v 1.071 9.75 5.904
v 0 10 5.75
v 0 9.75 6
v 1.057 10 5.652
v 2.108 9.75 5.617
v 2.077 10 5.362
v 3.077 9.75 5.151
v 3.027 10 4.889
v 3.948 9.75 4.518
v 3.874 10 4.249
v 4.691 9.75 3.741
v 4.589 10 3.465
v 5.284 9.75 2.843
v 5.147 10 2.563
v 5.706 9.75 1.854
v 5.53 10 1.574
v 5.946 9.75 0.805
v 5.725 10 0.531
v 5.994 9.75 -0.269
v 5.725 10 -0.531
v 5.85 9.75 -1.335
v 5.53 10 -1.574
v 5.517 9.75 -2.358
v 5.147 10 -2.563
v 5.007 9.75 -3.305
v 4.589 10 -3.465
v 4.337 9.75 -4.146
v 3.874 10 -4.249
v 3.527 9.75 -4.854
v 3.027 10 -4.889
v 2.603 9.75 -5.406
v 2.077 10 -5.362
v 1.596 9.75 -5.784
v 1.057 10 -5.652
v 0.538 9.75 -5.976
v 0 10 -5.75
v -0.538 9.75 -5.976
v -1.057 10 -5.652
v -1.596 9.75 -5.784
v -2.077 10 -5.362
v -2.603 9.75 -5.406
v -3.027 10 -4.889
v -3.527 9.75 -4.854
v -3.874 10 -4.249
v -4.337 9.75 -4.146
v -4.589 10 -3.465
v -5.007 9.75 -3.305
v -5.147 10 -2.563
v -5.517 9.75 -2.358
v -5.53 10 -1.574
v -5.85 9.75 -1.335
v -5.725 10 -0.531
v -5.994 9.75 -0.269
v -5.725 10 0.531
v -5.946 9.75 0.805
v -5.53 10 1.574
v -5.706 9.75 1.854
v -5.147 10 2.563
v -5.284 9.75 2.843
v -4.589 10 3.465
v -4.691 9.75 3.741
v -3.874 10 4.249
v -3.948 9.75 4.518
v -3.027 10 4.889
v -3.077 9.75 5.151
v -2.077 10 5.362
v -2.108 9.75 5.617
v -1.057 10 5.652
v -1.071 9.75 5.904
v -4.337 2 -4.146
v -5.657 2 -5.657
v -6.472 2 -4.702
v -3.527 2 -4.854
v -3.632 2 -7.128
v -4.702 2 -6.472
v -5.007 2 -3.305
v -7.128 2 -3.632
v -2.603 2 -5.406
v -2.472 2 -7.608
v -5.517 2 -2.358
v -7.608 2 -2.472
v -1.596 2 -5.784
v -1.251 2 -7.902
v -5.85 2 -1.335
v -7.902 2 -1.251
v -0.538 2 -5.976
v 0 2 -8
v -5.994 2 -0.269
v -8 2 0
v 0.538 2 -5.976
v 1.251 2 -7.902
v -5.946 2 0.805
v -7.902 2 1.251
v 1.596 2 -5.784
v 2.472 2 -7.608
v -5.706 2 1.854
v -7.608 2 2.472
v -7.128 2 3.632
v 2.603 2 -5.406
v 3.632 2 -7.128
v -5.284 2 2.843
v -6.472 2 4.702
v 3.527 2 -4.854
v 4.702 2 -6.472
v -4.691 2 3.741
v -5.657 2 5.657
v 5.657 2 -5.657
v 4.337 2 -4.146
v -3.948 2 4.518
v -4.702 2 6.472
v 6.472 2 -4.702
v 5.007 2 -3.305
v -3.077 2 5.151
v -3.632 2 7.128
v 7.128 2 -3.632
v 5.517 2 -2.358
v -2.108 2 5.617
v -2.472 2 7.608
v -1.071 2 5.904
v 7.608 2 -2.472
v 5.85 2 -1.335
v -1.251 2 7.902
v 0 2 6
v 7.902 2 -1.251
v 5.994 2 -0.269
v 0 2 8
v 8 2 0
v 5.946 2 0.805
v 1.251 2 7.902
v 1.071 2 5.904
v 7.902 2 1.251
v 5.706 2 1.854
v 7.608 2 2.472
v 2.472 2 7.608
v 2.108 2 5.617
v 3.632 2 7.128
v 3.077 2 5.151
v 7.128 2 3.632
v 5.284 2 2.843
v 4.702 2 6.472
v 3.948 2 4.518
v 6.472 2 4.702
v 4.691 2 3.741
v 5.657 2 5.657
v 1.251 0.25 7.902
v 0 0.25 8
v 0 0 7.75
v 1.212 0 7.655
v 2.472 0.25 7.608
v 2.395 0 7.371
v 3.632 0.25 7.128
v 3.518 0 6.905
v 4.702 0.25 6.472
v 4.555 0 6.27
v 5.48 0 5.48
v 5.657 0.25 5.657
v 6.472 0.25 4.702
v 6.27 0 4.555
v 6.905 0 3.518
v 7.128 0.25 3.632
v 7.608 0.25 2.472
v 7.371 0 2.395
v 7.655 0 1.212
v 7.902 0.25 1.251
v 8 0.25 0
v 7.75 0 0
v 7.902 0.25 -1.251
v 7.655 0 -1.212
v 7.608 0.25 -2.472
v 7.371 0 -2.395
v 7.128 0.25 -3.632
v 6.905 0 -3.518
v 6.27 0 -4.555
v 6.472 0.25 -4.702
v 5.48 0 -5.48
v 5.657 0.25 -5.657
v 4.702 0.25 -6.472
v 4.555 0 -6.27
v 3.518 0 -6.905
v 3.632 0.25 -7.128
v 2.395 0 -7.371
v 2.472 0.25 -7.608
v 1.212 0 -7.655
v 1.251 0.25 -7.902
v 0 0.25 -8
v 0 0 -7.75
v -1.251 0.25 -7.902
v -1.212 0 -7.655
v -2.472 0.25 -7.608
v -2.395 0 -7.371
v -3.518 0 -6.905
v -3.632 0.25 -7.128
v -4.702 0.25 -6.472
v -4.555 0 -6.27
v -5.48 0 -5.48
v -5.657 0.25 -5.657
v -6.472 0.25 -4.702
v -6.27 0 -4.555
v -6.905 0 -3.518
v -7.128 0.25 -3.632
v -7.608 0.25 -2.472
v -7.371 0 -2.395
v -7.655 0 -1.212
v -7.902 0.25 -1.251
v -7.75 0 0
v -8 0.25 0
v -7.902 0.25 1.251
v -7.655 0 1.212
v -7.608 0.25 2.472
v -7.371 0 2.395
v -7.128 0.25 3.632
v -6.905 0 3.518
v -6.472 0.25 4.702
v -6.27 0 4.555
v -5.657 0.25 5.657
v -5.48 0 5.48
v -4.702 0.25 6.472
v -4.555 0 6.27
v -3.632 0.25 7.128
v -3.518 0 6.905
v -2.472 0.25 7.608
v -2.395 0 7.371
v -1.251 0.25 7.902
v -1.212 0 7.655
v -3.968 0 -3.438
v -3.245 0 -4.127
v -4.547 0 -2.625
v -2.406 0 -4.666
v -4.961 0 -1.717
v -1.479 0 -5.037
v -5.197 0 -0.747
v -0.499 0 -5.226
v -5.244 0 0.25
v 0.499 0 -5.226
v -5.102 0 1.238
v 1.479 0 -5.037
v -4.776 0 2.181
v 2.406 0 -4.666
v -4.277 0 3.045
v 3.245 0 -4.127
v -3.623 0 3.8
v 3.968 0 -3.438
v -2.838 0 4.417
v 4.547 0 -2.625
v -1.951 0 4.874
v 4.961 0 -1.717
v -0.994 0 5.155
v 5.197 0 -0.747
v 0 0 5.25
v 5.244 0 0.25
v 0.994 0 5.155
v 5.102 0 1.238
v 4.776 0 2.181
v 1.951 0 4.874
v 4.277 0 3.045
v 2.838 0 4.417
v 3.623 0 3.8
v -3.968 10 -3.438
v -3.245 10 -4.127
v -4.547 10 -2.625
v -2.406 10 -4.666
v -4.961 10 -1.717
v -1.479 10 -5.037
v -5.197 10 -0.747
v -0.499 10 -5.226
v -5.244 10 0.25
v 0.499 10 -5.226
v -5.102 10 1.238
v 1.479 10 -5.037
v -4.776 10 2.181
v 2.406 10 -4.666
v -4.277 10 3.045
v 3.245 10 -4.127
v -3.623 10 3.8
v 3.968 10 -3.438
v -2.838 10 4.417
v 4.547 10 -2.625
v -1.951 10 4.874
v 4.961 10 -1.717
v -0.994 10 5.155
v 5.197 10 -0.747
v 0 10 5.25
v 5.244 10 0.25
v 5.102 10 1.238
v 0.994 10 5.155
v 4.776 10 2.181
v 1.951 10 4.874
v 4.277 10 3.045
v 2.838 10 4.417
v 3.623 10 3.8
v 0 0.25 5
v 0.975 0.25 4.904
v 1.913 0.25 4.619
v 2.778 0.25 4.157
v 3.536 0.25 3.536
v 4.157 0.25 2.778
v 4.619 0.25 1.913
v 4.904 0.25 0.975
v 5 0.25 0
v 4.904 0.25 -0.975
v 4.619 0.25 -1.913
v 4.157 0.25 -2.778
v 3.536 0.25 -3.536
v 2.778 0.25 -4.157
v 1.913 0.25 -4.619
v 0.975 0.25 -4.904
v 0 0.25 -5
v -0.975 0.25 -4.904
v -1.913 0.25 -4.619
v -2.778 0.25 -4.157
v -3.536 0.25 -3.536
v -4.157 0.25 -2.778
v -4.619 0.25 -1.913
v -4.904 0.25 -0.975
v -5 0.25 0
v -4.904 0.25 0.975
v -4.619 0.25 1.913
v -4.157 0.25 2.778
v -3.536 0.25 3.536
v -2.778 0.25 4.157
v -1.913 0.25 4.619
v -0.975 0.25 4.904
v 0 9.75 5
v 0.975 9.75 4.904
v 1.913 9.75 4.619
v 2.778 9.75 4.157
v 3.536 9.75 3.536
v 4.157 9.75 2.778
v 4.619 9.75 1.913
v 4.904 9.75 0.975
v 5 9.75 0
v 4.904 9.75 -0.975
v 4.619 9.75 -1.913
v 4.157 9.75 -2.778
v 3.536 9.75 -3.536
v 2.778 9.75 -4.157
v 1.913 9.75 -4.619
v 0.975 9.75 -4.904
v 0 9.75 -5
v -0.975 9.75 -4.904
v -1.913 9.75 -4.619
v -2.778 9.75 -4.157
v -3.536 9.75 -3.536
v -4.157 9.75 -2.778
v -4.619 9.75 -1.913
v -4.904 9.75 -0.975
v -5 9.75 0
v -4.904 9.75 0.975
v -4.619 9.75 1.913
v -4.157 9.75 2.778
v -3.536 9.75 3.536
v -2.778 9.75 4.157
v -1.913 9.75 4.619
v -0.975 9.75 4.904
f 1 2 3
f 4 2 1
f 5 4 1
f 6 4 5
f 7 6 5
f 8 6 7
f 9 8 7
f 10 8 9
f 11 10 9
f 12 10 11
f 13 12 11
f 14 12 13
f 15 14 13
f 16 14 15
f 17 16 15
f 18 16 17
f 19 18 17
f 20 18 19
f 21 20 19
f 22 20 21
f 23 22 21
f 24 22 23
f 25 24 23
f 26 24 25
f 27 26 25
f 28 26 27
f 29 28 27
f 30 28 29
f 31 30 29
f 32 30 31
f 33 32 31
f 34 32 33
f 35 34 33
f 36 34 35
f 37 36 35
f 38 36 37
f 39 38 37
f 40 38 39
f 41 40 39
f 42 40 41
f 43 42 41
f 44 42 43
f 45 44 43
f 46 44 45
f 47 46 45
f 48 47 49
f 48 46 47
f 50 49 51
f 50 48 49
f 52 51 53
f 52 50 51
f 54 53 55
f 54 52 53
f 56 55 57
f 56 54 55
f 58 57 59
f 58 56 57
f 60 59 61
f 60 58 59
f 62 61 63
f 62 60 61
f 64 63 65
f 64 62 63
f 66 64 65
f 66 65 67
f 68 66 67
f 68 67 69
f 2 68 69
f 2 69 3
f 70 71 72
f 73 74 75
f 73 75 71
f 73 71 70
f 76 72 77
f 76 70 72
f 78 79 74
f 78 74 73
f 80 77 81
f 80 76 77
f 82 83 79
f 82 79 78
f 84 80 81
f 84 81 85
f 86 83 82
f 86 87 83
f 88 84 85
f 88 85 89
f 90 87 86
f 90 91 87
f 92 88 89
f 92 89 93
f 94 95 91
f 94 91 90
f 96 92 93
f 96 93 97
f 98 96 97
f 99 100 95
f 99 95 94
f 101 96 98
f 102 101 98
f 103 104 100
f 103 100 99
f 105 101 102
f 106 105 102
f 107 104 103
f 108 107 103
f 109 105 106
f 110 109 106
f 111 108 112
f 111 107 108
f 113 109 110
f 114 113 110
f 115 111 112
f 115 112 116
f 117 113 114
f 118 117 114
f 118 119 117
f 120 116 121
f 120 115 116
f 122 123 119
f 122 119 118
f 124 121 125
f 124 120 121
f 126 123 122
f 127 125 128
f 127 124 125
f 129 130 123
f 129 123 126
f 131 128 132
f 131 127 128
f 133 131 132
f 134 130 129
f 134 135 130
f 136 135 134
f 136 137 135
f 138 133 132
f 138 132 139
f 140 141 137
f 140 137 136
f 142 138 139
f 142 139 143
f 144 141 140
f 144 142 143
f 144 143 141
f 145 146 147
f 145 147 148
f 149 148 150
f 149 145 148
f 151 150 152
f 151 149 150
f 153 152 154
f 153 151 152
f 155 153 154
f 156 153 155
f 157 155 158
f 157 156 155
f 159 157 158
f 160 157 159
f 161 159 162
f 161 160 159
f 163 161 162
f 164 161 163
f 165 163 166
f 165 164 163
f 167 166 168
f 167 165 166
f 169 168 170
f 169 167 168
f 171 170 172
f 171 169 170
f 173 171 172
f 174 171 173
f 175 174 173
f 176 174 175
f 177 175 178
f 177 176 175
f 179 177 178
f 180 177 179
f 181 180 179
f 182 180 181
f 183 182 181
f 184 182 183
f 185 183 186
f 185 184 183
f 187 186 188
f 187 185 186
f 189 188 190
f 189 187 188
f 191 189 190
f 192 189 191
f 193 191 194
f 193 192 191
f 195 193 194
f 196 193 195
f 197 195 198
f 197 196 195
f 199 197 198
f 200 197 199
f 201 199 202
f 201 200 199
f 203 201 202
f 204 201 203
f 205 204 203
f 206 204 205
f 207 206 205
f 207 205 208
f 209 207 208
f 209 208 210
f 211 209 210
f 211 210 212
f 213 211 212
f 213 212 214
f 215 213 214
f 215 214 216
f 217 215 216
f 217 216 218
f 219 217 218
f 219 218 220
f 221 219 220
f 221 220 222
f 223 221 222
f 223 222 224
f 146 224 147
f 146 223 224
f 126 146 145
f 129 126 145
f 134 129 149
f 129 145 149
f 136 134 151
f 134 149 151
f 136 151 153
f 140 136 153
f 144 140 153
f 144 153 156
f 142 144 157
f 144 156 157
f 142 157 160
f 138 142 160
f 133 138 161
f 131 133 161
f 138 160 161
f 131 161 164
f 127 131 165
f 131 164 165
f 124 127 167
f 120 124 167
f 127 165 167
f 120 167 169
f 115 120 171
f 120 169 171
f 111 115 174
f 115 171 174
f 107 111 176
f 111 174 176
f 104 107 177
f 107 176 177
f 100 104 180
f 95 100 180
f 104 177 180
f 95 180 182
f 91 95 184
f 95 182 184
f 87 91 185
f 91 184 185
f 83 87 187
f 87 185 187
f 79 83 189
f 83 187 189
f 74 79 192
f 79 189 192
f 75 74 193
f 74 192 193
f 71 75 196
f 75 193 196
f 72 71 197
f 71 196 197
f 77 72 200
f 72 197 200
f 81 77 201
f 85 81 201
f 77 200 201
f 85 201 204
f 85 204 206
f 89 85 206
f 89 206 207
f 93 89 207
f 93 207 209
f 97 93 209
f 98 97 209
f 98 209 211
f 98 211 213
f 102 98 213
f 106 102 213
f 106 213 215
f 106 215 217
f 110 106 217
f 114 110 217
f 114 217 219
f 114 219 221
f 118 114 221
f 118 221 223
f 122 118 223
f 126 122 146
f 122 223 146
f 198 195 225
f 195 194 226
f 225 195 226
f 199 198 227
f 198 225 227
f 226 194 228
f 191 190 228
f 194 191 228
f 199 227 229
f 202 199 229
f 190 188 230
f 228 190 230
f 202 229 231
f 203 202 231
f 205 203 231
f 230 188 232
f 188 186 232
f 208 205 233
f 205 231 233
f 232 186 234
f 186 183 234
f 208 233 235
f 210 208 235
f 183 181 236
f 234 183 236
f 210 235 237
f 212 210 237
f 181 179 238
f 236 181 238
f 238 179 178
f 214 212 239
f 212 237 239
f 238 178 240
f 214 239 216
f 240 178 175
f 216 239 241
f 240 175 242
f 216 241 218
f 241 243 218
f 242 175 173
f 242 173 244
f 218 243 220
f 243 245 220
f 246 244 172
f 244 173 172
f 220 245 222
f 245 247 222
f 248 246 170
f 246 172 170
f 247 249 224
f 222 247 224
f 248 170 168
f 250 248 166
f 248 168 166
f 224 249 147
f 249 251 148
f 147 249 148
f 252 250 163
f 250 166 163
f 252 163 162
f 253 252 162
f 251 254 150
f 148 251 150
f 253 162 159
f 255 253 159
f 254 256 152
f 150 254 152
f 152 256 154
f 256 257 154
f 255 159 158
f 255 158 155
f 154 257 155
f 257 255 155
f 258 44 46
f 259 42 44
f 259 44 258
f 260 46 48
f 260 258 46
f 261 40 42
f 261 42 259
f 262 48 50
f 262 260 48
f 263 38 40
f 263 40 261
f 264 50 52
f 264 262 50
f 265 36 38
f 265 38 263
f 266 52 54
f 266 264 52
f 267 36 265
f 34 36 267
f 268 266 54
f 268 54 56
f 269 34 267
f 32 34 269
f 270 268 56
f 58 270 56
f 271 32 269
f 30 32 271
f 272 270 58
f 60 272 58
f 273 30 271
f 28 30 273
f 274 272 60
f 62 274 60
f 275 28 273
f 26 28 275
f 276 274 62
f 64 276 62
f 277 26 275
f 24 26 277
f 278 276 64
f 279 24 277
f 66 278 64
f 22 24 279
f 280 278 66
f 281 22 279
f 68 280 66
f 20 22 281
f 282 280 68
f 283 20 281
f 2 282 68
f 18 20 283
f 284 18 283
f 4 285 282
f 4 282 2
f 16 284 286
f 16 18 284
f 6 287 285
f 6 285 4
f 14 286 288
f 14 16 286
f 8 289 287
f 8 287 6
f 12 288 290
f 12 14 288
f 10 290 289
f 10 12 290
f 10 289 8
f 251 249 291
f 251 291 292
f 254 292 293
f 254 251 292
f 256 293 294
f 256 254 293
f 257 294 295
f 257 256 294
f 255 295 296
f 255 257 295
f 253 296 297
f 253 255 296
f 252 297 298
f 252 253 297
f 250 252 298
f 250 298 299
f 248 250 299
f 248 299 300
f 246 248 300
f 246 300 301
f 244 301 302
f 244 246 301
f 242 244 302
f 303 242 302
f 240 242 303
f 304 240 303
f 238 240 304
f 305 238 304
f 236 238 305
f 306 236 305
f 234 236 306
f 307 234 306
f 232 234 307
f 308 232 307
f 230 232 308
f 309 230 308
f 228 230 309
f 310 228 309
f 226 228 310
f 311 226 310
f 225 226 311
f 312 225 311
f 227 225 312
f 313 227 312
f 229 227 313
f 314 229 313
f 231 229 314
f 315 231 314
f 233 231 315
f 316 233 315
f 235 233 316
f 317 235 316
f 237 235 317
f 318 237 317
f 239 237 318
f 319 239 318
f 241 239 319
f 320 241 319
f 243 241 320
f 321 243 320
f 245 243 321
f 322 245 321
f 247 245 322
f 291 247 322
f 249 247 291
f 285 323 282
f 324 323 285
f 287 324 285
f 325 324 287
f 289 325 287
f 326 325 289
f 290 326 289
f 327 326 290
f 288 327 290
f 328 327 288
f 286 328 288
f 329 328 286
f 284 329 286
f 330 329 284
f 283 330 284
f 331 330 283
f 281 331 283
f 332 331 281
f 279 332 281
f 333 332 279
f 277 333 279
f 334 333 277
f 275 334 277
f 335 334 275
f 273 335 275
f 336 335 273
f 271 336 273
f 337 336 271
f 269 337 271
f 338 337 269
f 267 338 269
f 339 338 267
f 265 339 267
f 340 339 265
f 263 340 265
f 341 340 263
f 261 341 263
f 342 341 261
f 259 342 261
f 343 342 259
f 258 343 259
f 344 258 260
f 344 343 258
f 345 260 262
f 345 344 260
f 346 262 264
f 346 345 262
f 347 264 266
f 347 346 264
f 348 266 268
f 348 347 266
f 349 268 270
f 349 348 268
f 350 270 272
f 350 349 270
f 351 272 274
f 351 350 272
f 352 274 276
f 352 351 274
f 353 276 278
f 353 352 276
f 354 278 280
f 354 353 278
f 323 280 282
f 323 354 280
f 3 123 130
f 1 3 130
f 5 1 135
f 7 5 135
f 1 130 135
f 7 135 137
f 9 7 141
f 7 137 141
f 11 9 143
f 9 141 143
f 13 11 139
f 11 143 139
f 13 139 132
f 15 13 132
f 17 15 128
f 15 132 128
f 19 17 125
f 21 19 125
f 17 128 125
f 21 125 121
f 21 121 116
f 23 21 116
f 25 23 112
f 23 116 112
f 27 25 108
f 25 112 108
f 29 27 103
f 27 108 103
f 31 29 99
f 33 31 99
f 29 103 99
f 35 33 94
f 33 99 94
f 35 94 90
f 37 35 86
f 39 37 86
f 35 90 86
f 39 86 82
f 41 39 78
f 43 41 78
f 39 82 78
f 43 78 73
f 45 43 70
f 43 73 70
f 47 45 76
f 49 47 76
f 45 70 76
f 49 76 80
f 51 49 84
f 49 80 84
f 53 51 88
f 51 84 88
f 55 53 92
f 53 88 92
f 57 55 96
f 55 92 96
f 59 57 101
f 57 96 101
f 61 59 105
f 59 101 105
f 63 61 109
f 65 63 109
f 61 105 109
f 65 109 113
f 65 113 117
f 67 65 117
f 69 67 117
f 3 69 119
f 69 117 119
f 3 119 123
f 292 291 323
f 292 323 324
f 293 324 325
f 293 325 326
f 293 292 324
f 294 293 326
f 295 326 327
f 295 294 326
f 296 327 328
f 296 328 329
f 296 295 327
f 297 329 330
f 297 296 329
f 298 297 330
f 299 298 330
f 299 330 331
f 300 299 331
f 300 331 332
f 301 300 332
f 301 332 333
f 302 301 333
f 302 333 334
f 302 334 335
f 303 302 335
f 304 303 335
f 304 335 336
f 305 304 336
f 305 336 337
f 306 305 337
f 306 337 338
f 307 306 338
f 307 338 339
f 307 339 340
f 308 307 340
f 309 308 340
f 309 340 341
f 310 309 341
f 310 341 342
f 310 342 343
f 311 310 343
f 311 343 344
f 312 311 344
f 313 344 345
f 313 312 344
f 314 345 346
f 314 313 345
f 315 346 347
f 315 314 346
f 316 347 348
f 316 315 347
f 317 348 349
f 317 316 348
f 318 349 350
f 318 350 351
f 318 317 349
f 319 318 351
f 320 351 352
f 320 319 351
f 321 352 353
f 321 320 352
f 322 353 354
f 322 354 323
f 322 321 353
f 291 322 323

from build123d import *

# Parameters (mm, degrees)
SKETCH_1_R      = 8
SKETCH_1_R_2    = 5
EXTRUDE_1_DEPTH = 2
SKETCH_2_R      = 6
SKETCH_2_R_2    = 5
EXTRUDE_2_DEPTH = 8
CHAMFER_1_SIZE  = 0.25


with BuildPart() as part:
    # 草图1 → 凸台-拉伸1 (new body)
    with BuildSketch(Plane(origin=(0, 0, 0), x_dir=(1, 0, 0), z_dir=(0, 1, 0))):
        with Locations(Location((0, 0, 0), (0, 0, 270))):
            Circle(SKETCH_1_R)
        with Locations(Location((0, 0, 0), (0, 0, 270))):
            Circle(SKETCH_1_R_2, mode=Mode.SUBTRACT)
    extrude(amount=EXTRUDE_1_DEPTH)

    # 草图2 → 凸台-拉伸2 (add)
    with BuildSketch(Plane(origin=(0, 2, 0), x_dir=(1, 0, 0), z_dir=(0, 1, 0))):
        with Locations(Location((0, 0, 0), (0, 0, 270))):
            Circle(SKETCH_2_R)
        with Locations(Location((0, 0, 0), (0, 0, 270))):
            Circle(SKETCH_2_R_2, mode=Mode.SUBTRACT)
    extrude(amount=EXTRUDE_2_DEPTH)

    # 倒角1
    chamfer_1_edges = [part.edges().sort_by_distance(p)[0] for p in [
        (0, 10, -6),
        (0, 10, -5),
        (0, 0, -8),
        (0, 0, -5),
    ]]
    chamfer(chamfer_1_edges, length=CHAMFER_1_SIZE)


solid = part.part
